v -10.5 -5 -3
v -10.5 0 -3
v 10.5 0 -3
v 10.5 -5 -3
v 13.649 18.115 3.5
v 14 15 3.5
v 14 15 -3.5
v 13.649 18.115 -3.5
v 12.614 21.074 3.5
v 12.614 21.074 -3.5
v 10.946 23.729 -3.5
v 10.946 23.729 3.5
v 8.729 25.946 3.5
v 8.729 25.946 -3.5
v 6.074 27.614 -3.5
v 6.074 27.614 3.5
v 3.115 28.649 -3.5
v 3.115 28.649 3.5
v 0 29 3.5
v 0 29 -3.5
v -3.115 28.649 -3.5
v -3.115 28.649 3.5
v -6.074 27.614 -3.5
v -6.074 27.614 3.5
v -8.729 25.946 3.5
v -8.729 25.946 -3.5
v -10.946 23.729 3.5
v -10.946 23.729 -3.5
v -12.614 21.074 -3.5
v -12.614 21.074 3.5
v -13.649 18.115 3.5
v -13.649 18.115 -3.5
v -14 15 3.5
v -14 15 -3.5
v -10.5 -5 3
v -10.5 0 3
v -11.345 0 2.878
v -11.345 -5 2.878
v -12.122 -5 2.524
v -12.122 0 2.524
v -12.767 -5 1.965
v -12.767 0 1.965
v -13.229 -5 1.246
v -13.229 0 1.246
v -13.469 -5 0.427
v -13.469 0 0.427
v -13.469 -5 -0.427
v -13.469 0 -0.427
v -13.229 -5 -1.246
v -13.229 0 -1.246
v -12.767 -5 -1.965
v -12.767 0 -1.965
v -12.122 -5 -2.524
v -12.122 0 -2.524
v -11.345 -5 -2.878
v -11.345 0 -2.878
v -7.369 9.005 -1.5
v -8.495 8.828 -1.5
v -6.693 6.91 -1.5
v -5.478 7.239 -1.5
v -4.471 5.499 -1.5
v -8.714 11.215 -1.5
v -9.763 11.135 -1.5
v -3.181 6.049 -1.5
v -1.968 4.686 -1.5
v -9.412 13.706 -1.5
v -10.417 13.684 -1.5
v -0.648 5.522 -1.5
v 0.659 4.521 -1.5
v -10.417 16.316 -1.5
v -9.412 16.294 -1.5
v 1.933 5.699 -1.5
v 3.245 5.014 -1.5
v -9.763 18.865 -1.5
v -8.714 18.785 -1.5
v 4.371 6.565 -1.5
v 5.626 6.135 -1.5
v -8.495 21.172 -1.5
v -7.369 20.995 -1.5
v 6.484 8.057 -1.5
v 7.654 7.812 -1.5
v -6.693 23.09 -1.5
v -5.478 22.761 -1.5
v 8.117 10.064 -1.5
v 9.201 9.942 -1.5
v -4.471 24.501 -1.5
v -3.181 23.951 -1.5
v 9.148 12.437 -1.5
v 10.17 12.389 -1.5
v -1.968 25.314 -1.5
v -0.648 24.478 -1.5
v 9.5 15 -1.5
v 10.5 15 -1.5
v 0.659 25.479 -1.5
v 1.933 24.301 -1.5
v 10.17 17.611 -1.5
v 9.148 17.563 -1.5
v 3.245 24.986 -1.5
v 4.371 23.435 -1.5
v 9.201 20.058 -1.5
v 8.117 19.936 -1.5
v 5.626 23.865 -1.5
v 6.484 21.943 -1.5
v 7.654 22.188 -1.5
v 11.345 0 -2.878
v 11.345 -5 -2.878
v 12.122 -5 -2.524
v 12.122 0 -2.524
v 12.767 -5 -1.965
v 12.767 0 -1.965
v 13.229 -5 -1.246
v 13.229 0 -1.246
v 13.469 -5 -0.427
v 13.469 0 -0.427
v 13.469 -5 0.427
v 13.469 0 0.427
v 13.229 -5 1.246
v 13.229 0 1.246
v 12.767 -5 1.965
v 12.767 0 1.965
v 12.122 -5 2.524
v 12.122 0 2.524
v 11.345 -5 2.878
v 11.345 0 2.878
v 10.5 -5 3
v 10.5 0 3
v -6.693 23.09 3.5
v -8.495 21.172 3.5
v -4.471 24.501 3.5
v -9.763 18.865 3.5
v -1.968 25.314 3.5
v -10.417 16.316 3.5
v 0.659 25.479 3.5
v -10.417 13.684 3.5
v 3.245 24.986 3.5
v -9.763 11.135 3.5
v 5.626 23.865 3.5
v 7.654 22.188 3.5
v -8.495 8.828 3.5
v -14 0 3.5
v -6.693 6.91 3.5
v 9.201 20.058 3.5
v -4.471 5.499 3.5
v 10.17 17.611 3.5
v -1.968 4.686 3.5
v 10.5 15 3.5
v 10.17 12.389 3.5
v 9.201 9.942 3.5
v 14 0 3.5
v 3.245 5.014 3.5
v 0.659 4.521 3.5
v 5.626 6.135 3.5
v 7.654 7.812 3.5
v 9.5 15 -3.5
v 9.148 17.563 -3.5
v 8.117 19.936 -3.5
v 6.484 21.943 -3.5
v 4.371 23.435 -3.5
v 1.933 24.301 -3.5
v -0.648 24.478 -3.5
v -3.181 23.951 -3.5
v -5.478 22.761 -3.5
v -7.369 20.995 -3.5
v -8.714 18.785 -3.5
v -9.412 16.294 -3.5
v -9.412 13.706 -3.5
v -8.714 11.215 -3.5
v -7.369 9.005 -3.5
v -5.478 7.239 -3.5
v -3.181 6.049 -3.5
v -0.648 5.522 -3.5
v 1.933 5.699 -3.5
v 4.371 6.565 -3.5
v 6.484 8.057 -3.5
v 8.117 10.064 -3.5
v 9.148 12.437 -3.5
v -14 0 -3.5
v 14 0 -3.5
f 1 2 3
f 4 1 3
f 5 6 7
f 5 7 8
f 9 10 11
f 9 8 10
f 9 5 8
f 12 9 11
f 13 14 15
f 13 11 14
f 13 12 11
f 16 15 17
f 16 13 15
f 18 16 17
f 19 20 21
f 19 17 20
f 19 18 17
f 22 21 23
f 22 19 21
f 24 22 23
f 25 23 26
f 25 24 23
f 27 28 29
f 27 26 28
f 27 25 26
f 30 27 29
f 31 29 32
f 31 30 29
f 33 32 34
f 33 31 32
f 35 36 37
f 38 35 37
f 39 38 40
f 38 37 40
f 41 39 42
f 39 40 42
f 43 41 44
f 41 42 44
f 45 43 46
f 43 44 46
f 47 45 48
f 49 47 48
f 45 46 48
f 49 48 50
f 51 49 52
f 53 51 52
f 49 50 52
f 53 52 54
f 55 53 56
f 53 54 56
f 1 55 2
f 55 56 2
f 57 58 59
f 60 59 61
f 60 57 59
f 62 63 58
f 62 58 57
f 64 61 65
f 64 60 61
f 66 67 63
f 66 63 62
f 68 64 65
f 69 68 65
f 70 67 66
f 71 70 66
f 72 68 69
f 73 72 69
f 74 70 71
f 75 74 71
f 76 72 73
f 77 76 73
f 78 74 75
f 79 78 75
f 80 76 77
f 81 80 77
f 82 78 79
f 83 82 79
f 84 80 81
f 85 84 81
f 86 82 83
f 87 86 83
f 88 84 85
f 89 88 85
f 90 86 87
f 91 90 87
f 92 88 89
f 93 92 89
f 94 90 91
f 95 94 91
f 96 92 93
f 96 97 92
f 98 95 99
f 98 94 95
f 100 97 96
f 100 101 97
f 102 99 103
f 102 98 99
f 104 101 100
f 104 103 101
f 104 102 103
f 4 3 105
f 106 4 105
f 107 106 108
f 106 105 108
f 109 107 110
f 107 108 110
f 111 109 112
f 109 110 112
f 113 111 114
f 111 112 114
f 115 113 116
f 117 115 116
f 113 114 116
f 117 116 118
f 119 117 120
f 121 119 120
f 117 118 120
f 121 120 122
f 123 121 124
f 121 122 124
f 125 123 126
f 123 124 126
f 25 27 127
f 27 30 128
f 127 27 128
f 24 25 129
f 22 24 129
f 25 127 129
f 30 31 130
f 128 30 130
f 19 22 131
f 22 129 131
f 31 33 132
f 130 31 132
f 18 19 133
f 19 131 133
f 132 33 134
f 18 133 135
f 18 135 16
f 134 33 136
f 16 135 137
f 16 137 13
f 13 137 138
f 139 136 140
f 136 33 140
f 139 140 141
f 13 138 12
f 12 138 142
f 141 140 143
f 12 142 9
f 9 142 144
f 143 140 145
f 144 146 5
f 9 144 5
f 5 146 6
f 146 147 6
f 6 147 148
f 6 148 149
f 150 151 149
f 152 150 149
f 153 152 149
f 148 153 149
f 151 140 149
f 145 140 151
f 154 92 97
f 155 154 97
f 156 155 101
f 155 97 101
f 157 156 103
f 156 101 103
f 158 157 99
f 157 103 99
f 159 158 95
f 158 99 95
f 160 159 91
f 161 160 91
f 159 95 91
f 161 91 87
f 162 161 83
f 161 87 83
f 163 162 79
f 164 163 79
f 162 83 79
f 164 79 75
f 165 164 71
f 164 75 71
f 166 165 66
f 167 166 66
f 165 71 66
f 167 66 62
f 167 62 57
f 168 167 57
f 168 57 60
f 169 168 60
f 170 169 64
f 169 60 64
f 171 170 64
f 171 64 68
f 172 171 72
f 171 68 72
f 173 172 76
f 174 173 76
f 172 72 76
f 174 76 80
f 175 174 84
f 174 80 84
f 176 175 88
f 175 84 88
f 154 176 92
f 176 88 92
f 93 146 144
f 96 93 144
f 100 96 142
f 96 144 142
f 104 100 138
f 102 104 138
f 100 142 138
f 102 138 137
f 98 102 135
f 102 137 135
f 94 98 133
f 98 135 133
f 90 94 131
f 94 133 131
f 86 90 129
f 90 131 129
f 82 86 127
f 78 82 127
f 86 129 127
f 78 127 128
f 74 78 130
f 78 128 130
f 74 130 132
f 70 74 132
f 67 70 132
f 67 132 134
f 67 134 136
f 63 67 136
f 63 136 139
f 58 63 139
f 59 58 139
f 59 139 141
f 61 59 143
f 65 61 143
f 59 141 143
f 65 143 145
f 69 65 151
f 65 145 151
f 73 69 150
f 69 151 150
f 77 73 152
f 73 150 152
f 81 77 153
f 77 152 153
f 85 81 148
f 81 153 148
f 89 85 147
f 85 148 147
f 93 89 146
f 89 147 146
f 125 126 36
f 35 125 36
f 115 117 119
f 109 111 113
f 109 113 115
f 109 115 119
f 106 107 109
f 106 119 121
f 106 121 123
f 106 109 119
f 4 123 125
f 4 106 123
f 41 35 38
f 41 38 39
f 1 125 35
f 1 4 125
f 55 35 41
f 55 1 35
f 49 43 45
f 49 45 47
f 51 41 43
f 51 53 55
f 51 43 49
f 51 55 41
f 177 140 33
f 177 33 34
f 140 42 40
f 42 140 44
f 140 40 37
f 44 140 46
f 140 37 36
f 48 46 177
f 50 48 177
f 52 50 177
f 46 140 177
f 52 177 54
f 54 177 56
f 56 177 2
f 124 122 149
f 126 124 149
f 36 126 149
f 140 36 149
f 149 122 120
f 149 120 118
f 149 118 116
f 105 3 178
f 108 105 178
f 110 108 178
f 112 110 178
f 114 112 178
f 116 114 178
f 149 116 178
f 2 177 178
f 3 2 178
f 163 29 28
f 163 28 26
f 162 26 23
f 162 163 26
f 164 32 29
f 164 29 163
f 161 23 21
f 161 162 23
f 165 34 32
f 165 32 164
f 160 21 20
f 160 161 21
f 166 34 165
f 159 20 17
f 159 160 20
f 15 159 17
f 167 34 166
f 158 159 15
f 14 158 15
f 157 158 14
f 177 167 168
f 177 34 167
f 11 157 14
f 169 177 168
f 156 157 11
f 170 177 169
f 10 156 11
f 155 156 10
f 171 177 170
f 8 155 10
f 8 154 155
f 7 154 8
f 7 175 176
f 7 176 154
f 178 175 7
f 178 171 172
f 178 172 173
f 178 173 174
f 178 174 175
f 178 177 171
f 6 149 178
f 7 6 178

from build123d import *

# Parameters (mm, degrees)
BOSS_EXTRUDE1_DEPTH = 5
SKETCH2_W           = 28
SKETCH2_H           = 7
BOSS_EXTRUDE2_DEPTH = 29
CUT_EXTRUDE1_DEPTH  = 7
SKETCH4_R           = 10.5
CUT_EXTRUDE2_DEPTH  = 5
SKETCH5_R           = 9.5
CUT_EXTRUDE3_DEPTH  = 2


with BuildPart() as part:
    # Sketch1 → Boss-Extrude1 (new body)
    with BuildSketch(Plane(origin=(0, 0, 0), x_dir=(1, 0, 0), z_dir=(0, 1, 0))):
        with BuildLine():
            Line((-10.5, 3), (10.5, 3))
            ThreePointArc((10.5, 3), (13.5, 0), (10.5, -3))
            Line((10.5, -3), (-10.5, -3))
            ThreePointArc((-10.5, -3), (-13.5, 0), (-10.5, 3))
        make_face()
    extrude(amount=-BOSS_EXTRUDE1_DEPTH)

    # Sketch2 → Boss-Extrude2 (add)
    with BuildSketch(Plane(origin=(0, 0, 0), x_dir=(1, 0, 0), z_dir=(0, 1, 0))):
        Rectangle(SKETCH2_W, SKETCH2_H)
    extrude(amount=BOSS_EXTRUDE2_DEPTH)

    # Sketch3 → Cut-Extrude1 (cut)
    with BuildSketch(Plane.XY.offset(3.5)):
        with BuildLine():
            Line((-14, 15), (-14, 33.512664493))
            Line((-14, 33.512664493), (14, 33.512664493))
            Line((14, 33.512664493), (14, 15))
            ThreePointArc((14, 15), (0, 29), (-14, 15))
        make_face()
    extrude(amount=-CUT_EXTRUDE1_DEPTH, mode=Mode.SUBTRACT)

    # Sketch4 → Cut-Extrude2 (cut)
    with BuildSketch(Plane.XY.offset(3.5)):
        with Locations((0, 15)):
            Circle(SKETCH4_R)
    extrude(amount=-CUT_EXTRUDE2_DEPTH, mode=Mode.SUBTRACT)

    # Sketch5 → Cut-Extrude3 (cut)
    with BuildSketch(Plane.XY.offset(-1.5)):
        with Locations((0, 15)):
            Circle(SKETCH5_R)
    extrude(amount=-CUT_EXTRUDE3_DEPTH, mode=Mode.SUBTRACT)


solid = part.part
